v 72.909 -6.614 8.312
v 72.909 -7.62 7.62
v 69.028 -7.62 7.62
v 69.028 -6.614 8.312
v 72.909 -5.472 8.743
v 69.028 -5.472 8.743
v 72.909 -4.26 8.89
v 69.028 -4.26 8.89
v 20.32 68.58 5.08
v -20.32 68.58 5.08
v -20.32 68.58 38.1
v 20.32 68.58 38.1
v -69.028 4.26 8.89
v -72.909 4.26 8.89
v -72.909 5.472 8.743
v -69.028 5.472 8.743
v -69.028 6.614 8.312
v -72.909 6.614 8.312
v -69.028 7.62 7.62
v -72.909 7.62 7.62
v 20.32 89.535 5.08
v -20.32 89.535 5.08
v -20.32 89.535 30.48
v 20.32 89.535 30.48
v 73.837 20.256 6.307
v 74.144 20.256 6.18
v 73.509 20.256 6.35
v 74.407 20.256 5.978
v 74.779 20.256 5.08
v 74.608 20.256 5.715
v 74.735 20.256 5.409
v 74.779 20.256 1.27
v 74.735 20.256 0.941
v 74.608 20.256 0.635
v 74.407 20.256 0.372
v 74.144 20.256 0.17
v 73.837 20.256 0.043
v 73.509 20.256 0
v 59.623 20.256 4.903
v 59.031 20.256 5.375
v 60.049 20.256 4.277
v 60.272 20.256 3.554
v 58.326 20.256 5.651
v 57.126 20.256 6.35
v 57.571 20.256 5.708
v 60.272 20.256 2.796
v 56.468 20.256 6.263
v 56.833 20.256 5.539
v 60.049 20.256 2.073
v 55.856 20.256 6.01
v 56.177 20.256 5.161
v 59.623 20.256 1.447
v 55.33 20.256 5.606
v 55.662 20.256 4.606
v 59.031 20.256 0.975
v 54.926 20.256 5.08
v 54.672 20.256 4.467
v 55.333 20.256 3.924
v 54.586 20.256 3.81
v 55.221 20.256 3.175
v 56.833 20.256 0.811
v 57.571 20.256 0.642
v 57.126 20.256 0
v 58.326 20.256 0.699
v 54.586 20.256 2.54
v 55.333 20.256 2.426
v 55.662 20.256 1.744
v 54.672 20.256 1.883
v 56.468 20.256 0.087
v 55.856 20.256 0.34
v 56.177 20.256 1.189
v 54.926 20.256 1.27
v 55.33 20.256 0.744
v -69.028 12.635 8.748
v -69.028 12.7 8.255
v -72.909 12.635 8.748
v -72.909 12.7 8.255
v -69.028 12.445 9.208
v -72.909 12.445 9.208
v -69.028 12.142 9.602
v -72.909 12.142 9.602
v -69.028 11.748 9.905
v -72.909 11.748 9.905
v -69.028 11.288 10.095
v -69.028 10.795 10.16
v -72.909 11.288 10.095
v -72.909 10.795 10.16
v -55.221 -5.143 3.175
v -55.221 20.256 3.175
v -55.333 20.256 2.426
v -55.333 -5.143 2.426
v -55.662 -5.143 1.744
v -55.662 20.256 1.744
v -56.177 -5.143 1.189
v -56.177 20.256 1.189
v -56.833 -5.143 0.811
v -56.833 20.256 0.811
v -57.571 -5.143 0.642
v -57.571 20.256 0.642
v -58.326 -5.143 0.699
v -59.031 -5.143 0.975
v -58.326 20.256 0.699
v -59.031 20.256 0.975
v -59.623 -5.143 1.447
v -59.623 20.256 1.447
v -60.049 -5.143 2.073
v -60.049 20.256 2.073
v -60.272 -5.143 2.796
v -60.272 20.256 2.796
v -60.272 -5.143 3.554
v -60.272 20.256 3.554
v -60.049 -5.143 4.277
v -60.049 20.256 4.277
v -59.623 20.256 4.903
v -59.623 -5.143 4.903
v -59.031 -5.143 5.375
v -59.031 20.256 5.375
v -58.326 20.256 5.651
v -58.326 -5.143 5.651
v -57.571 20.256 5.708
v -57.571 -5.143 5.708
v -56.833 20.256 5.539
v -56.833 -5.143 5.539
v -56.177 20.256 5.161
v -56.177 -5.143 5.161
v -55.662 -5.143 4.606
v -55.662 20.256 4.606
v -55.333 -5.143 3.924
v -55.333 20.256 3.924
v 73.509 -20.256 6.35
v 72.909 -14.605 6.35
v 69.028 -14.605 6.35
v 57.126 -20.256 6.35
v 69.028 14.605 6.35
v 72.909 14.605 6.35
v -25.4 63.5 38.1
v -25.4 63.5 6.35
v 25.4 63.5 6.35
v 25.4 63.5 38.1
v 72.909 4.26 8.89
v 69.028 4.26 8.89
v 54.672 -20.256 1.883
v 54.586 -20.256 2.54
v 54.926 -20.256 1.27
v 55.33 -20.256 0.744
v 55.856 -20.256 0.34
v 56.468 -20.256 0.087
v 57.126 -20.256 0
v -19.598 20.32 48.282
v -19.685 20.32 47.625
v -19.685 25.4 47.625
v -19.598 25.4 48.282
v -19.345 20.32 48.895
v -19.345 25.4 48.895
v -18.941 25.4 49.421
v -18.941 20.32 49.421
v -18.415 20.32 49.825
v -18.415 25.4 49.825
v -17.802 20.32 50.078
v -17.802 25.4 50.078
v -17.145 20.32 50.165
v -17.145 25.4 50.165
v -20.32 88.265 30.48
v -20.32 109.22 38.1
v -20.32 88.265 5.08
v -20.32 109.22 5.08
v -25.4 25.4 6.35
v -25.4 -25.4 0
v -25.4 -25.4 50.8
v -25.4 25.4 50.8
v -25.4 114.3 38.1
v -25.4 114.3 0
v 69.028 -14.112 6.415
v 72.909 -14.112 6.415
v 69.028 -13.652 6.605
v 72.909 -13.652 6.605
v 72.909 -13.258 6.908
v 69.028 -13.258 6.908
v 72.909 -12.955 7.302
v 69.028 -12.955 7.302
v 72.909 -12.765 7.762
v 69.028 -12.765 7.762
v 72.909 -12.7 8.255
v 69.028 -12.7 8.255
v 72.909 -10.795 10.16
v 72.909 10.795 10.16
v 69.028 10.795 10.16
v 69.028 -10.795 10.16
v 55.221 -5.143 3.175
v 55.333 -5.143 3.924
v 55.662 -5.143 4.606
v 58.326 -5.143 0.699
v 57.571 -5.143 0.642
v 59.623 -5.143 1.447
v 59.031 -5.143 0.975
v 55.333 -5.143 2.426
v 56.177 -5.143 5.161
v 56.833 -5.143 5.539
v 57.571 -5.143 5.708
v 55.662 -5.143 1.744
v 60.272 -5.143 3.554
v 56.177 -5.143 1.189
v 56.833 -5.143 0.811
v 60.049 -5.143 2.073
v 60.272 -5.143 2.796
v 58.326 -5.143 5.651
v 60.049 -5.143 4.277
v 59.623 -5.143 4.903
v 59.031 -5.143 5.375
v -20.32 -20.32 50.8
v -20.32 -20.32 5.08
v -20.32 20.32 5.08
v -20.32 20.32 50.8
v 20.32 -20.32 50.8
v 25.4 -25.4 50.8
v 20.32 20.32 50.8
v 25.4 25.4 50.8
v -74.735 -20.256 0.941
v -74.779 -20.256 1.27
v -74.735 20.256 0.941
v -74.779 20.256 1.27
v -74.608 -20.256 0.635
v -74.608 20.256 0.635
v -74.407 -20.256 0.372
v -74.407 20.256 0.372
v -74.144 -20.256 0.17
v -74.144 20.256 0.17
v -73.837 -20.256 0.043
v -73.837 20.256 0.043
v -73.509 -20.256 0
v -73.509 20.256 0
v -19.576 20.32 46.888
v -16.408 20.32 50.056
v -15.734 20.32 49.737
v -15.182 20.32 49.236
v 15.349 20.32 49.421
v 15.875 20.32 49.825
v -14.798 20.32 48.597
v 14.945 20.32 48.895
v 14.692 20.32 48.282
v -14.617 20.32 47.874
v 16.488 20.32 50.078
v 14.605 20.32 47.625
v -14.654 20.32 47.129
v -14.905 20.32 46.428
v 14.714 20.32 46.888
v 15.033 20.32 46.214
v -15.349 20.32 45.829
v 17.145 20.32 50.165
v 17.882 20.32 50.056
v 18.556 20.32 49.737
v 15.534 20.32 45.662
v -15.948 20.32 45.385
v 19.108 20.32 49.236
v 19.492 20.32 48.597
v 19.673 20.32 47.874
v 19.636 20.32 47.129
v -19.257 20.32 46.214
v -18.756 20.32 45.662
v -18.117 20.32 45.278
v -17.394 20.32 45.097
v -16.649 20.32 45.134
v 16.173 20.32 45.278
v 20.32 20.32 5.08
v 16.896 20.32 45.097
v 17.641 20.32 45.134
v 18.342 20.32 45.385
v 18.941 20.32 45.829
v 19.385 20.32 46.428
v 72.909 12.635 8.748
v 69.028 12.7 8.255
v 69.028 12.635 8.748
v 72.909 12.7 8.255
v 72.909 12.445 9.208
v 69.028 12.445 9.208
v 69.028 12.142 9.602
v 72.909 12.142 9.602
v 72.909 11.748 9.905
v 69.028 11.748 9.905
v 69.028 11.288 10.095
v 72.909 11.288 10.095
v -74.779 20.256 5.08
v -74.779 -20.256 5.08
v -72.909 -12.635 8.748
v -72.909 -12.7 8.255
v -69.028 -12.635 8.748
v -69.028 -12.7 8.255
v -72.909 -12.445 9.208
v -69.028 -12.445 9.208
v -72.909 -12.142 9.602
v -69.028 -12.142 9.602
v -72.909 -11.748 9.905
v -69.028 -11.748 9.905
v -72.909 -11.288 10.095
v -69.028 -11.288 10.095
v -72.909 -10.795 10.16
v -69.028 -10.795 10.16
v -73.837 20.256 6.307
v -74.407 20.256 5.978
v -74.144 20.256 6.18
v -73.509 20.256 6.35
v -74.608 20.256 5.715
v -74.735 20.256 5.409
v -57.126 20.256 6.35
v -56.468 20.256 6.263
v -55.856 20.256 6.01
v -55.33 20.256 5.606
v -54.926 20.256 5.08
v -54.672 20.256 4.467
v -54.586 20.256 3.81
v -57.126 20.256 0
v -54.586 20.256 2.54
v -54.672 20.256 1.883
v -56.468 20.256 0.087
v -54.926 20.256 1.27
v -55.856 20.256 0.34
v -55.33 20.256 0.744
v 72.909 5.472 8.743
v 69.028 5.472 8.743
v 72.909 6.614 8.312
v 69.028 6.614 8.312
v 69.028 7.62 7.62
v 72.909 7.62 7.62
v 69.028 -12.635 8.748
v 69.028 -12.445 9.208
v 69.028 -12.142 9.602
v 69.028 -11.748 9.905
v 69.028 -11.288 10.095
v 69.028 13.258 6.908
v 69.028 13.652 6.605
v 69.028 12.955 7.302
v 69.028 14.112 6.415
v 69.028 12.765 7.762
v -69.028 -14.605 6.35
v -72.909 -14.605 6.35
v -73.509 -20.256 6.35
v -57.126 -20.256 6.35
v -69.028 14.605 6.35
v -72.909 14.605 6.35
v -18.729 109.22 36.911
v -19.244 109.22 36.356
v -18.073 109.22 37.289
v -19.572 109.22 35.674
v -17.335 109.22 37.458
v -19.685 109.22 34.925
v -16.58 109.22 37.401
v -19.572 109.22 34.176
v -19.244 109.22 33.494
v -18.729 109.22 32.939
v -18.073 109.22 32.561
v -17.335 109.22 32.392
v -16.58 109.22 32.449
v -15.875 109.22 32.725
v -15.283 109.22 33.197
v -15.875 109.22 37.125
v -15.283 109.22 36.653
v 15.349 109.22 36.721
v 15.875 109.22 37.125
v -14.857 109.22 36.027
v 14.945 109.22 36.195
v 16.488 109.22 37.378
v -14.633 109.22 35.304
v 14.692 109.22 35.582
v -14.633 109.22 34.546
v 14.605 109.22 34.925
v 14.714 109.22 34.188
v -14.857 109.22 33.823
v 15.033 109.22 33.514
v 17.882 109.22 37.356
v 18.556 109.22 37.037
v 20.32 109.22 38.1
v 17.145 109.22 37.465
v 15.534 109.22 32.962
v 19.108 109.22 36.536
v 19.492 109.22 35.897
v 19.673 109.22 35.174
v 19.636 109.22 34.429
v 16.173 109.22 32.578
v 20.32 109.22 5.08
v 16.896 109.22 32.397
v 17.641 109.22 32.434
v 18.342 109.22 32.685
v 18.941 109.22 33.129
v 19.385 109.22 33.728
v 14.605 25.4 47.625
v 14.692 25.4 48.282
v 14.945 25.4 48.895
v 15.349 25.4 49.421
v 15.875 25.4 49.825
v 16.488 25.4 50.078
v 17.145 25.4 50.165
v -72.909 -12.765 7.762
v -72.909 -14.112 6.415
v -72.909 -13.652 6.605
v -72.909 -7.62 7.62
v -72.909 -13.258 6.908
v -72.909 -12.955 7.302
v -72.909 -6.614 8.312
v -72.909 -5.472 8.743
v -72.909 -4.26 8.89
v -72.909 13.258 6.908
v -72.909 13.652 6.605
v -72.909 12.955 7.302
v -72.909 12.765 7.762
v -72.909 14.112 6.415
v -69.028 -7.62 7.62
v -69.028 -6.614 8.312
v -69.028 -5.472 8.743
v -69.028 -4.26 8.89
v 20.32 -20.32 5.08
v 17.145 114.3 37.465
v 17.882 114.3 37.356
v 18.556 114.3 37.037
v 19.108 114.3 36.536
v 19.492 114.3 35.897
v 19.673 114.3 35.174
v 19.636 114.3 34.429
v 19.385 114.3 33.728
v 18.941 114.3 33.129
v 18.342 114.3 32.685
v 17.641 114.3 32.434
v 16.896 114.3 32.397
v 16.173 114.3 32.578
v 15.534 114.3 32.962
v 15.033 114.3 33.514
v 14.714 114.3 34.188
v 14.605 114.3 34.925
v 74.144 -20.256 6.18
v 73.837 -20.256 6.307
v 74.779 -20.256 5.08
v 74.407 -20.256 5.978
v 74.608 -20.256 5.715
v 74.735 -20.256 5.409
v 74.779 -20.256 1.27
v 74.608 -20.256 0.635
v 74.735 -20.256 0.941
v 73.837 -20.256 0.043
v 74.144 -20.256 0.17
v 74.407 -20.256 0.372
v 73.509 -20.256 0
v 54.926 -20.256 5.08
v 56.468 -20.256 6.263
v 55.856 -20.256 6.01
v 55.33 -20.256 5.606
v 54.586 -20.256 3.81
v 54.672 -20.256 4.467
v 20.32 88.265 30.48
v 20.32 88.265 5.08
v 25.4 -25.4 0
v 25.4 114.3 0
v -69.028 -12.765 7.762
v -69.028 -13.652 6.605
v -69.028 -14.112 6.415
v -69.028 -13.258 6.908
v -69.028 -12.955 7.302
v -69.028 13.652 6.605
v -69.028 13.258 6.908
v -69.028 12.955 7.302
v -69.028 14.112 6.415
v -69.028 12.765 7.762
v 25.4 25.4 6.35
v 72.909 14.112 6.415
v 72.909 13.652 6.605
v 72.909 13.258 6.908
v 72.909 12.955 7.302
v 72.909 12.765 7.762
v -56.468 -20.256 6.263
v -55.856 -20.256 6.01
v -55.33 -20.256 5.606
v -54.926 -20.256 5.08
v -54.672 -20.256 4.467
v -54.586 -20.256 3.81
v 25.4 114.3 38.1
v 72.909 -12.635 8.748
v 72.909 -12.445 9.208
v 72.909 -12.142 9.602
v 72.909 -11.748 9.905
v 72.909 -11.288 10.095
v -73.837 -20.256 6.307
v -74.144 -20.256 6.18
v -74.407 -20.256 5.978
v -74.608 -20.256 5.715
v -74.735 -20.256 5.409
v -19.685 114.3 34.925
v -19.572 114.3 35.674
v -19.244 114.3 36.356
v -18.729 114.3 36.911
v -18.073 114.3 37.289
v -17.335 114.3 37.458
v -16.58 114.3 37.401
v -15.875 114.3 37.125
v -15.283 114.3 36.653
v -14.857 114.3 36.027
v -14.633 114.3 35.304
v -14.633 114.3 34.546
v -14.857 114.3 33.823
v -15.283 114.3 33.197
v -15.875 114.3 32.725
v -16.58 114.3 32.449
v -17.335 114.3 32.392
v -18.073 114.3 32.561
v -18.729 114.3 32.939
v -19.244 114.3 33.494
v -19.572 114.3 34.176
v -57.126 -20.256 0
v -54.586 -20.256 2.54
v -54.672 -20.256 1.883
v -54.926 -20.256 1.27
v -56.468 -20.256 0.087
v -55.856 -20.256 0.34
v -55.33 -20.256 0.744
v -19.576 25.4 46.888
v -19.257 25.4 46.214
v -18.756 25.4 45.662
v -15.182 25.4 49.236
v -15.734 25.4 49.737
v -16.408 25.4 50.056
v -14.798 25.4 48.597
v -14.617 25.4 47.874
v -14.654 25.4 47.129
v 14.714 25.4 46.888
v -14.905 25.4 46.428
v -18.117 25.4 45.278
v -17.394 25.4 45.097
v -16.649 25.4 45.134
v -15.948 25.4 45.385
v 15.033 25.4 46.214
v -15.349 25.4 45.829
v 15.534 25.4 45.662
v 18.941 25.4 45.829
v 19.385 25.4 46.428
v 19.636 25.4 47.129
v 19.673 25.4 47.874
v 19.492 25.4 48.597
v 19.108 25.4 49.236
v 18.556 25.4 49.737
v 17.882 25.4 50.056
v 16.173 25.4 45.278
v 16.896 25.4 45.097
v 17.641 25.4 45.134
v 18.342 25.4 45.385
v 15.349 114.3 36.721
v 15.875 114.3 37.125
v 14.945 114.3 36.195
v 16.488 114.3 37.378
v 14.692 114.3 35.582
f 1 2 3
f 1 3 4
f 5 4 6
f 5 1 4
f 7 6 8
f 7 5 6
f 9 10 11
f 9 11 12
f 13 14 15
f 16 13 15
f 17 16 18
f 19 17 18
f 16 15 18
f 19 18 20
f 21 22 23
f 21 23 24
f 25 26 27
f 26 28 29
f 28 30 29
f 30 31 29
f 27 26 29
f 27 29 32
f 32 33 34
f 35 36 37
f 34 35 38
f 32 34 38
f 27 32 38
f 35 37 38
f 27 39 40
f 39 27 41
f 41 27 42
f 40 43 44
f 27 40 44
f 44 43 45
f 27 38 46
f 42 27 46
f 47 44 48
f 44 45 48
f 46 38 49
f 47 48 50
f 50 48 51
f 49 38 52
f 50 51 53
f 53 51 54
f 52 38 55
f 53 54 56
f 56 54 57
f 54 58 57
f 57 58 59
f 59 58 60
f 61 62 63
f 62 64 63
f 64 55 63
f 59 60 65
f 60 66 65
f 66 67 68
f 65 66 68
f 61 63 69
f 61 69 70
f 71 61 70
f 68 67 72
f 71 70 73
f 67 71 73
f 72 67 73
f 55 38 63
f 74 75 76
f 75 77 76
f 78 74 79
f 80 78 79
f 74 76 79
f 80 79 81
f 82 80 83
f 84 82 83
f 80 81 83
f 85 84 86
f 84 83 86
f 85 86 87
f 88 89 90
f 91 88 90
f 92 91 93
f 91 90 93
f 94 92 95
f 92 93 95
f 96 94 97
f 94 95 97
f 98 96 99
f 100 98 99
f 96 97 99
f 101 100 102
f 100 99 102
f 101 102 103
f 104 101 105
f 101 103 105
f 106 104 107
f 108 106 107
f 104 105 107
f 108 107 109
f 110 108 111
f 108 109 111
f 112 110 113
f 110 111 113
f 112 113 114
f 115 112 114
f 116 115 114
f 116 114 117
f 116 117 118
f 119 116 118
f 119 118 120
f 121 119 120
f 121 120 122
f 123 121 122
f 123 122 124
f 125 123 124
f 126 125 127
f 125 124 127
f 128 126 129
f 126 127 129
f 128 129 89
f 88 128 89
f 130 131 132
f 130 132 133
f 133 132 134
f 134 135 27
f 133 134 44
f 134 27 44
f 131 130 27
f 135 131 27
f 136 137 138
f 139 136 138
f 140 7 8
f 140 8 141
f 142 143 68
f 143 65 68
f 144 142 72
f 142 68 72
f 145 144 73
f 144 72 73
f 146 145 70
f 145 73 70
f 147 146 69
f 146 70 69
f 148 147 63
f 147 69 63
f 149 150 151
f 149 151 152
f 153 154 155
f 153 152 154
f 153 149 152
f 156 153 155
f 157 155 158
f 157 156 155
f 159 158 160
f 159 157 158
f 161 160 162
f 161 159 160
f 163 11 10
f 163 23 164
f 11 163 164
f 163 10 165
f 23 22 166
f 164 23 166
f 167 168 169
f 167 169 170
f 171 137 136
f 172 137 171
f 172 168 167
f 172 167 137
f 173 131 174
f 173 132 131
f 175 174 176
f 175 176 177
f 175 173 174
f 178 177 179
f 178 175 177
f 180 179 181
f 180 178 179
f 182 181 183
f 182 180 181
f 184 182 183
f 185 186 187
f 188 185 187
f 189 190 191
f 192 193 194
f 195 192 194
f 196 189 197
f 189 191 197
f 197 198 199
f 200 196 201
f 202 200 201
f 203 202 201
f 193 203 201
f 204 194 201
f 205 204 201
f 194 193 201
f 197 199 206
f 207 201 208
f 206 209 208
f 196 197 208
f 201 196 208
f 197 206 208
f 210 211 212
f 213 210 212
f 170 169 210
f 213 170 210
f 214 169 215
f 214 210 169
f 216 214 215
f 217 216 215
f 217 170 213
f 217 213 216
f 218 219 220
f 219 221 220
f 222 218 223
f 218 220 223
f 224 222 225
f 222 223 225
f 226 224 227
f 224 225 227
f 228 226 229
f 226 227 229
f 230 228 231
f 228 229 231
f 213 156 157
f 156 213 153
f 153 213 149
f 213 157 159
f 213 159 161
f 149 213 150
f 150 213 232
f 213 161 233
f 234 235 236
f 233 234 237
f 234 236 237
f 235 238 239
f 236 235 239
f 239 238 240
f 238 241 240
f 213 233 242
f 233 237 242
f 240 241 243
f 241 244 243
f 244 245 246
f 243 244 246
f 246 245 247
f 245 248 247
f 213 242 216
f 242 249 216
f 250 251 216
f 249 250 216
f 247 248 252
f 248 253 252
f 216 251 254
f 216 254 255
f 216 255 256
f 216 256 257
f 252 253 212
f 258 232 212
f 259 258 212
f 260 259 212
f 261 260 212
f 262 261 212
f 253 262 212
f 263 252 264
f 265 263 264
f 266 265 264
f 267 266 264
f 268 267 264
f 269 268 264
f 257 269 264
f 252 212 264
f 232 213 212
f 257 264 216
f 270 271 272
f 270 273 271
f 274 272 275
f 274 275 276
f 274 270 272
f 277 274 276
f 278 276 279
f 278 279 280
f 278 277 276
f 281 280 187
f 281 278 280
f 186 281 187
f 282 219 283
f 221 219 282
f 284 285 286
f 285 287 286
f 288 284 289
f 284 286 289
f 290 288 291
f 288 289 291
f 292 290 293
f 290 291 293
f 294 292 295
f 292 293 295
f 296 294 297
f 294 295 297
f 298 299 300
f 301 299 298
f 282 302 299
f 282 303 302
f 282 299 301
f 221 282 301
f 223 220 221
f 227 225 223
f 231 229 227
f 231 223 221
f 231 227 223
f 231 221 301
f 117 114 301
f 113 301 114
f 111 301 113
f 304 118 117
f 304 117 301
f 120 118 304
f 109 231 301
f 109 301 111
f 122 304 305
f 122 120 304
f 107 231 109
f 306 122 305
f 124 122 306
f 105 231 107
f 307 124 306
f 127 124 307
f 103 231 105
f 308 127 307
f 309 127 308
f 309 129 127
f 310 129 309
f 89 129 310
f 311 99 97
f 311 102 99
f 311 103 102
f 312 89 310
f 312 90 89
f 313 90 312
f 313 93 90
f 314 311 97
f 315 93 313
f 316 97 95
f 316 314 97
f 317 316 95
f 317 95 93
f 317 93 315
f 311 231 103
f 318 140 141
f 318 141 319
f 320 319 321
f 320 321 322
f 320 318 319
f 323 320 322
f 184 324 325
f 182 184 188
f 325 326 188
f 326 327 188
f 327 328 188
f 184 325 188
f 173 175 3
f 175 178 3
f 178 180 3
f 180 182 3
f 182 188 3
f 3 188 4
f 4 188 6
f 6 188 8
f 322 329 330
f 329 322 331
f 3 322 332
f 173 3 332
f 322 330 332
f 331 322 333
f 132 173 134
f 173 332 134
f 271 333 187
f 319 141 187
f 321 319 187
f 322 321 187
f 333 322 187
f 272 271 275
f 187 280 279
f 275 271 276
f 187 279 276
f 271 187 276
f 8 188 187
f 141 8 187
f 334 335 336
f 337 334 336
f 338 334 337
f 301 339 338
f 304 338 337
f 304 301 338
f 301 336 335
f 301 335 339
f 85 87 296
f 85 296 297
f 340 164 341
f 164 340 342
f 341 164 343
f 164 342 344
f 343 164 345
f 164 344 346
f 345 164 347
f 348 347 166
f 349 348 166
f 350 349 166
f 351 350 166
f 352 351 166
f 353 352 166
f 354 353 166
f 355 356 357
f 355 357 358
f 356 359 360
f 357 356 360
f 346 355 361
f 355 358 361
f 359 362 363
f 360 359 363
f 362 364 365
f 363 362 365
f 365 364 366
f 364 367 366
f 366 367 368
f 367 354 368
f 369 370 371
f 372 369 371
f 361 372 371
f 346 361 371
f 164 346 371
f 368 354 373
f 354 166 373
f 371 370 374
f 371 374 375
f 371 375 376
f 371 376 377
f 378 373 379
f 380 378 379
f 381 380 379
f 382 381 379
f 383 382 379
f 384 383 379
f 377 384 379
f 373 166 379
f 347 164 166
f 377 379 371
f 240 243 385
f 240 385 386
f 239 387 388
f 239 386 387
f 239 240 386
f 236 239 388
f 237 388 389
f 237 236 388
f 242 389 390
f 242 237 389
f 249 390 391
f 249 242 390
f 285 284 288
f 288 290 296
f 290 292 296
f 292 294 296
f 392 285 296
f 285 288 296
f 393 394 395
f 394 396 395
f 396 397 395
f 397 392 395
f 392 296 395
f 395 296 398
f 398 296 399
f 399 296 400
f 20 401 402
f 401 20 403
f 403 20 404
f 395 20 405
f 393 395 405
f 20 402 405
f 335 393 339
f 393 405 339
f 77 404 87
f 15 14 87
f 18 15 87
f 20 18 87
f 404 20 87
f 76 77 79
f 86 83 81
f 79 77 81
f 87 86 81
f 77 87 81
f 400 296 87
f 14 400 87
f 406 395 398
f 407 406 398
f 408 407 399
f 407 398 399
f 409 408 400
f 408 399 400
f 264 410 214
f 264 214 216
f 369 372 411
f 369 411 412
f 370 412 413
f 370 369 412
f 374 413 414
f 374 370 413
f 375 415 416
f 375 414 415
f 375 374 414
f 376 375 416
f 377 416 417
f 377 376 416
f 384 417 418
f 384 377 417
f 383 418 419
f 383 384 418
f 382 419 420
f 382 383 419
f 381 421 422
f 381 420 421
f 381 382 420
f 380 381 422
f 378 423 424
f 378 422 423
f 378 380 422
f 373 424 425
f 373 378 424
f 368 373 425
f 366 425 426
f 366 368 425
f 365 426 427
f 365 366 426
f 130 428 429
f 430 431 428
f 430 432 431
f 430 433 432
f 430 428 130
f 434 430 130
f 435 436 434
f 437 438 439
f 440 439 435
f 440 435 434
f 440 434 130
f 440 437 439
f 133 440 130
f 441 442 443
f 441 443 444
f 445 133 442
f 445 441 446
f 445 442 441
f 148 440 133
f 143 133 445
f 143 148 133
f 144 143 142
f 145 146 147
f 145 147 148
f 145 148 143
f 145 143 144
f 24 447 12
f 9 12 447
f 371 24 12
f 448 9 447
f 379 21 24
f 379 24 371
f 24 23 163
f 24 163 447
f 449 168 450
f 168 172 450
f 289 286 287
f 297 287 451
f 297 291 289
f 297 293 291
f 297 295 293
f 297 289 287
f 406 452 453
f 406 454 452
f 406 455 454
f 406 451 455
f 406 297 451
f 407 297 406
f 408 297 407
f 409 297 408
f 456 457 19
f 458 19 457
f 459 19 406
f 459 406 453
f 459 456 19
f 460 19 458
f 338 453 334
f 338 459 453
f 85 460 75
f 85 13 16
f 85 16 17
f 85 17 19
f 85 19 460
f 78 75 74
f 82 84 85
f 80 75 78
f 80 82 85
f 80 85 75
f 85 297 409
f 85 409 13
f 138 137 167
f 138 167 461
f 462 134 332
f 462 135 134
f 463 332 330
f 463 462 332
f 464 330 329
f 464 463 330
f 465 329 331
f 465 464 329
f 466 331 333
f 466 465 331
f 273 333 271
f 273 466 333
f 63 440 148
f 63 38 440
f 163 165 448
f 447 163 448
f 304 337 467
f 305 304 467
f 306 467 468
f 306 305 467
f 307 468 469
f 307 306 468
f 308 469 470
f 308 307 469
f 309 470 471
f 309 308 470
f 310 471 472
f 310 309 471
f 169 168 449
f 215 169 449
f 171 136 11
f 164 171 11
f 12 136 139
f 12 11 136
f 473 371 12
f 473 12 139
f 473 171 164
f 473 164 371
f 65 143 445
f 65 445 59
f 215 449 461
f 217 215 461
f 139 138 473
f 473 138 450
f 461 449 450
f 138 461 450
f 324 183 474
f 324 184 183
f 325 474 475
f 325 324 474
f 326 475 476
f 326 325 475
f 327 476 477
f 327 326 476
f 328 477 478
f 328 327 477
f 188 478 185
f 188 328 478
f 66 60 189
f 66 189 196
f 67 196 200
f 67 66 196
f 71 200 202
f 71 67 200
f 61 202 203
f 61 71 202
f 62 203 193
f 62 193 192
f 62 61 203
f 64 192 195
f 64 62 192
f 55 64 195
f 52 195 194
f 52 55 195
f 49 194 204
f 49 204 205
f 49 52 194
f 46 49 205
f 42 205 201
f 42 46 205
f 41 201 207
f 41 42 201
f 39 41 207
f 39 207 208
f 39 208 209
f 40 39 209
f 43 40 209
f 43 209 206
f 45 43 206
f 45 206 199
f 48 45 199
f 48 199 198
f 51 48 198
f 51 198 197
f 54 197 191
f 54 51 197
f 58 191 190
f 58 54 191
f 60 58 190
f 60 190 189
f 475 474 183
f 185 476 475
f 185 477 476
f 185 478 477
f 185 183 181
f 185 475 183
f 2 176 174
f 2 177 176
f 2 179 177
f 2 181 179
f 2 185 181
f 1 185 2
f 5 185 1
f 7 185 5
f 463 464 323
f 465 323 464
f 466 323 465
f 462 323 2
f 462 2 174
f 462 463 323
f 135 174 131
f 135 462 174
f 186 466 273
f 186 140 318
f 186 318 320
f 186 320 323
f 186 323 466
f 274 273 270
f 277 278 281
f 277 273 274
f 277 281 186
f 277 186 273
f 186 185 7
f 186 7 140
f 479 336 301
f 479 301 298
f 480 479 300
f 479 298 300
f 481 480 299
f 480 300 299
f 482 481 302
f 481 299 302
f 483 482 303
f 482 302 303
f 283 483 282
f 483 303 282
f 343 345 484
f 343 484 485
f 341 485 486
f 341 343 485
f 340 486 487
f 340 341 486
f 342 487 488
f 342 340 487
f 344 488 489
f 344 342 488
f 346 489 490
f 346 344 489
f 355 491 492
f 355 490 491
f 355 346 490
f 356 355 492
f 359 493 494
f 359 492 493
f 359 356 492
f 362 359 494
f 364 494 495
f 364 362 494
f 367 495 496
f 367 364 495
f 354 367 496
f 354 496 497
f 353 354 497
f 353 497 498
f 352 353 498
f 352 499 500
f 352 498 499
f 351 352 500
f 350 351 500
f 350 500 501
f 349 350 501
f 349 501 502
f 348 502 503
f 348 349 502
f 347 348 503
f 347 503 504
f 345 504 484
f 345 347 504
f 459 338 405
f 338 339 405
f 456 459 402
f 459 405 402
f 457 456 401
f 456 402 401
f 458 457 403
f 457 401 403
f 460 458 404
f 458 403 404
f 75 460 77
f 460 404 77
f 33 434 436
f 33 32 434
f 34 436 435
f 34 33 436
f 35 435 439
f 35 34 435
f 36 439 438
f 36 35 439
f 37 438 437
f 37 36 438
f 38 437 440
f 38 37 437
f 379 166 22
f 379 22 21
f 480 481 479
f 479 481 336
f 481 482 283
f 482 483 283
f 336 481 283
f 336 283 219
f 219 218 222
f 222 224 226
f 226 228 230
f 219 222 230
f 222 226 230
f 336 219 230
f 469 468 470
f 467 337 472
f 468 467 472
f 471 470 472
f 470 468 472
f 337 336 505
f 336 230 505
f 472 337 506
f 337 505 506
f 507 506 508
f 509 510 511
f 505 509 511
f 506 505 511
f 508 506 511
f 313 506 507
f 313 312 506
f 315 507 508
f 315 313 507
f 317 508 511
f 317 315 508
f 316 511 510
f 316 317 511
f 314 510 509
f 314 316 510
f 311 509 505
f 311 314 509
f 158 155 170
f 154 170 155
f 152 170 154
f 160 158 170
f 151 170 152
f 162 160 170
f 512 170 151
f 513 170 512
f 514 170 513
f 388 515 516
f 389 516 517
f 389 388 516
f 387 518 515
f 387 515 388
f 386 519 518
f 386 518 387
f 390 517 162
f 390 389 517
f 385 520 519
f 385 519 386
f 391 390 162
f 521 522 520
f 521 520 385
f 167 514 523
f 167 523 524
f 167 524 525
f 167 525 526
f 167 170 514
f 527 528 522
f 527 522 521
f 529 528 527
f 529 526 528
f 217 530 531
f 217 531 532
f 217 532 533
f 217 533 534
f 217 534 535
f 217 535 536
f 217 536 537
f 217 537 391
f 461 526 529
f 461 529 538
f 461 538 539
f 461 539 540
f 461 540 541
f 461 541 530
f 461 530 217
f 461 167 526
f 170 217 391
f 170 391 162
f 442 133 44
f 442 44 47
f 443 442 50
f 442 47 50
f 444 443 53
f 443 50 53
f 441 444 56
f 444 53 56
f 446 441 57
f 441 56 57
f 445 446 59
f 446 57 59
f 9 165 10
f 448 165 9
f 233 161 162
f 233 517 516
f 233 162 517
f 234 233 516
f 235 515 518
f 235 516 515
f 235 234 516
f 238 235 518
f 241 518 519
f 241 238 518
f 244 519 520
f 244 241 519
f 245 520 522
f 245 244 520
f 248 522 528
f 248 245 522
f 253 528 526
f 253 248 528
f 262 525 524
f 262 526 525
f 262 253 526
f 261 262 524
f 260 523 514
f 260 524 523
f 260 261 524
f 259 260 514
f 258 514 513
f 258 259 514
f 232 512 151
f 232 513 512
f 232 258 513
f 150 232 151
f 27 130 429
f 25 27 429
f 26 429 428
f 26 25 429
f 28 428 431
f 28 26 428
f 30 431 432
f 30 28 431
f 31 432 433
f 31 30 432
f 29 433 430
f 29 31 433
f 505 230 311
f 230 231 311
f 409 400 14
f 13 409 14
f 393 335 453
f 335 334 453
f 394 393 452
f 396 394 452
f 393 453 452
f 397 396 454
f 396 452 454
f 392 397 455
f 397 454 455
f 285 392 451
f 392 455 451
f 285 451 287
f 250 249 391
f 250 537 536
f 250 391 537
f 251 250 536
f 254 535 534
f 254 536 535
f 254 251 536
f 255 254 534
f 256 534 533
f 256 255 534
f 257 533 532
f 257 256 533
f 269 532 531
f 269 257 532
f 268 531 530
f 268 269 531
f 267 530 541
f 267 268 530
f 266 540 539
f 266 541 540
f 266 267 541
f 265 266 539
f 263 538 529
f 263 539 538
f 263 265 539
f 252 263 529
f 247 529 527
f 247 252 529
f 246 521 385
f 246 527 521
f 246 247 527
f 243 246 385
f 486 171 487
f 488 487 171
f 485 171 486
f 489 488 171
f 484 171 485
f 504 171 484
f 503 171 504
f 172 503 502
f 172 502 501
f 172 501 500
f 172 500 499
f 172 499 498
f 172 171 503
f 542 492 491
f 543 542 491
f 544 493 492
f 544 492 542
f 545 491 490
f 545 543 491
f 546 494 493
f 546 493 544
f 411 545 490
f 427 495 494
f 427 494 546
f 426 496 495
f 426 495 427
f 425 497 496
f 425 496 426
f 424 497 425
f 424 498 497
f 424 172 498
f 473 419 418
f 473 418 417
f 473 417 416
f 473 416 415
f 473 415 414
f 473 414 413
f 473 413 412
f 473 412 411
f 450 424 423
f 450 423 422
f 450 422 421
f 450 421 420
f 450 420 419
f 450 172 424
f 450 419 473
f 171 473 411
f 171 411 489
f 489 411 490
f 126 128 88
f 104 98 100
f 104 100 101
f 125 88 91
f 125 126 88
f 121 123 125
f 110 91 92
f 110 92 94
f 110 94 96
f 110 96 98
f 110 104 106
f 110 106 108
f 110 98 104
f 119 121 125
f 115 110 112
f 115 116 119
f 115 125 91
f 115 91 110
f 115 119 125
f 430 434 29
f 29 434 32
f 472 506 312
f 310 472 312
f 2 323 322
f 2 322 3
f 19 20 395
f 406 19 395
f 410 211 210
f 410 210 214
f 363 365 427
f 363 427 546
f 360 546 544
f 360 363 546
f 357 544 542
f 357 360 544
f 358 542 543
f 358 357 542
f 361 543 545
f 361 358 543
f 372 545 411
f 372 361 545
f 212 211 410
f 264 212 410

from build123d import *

# Parameters (mm, degrees)
F0_W         = 50.8
F0_H         = 50.8
F1_DEPTH     = 50.8
F2_DEPTH     = 38.1
F0_H_2       = 38.1
F3_DEPTH     = 6.35
F4_T         = -5.08
F6_DEPTH     = 50.8
F7_W         = 20.193
F7_H         = 40.513
F8_DEPTH     = 6.35
F11_DEPTH    = 3.81
F12_W        = 7.62
F12_H        = 1.27
F13_DEPTH    = 25.4
F14_R        = 1.90499
F15_T1_DEPTH = 3.8801973377
F16_R        = 2.54
F17_DEPTH    = 50.8
F18_R        = 2.54
F19_R        = 1.27
F20_W        = 40.64
F20_H        = 0.635
F21_DEPTH    = 25.4
F22_DEPTH    = 25.4


# Not quite as in the source:
# - a fillet or chamfer that OpenCascade refuses, or shapes differently, is made with other operations: its cross-section is extruded or revolved along the edge and cut away or added
# - a fillet or chamfer is up to 0.001 mm smaller than in the source, because OpenCascade refuses the exact size


with BuildPart() as f1:
    # F0 (on Top) → F1 (new body)
    with BuildSketch(Plane.XY):
        Rectangle(F0_W, F0_H)
    extrude(amount=F1_DEPTH)



with BuildPart() as f2:
    # F0 (on Top) → F2 (new body)
    with BuildSketch(Plane.XY):
        with Locations((0, 88.9)):
            Rectangle(F0_W, F0_H)
    extrude(amount=F2_DEPTH)


with BuildPart() as f1_1:
    add(f1.part)

    add(f2.part)  # F3 merges F2
    # F0 (on Top) → F3 (join)
    with BuildSketch(Plane.XY):
        with Locations((0, 44.45)):
            Rectangle(F0_W, F0_H_2)
    extrude(amount=F3_DEPTH)

    # F4
    f4_openings = [f1_1.faces().sort_by_distance(p)[0] for p in [
        (0, 88.9, 38.1),
        (0, 0, 50.8),
    ]]
    offset(amount=F4_T, openings=f4_openings, kind=Kind.INTERSECTION)

    # F5 (on face) → F6 (cut)
    with BuildSketch(Plane(origin=(0, -20.32, 0), x_dir=(-1, 0, 0), z_dir=(0, 1, 0))):
        with BuildLine():
            ThreePointArc((-17.145, 50.165), (-18.9410512242, 45.8289487758), (-14.605, 47.625))
            ThreePointArc((-14.605, 47.625), (-15.3489487758, 49.4210512242), (-17.145, 50.165))
        make_face()
        with BuildLine():
            ThreePointArc((17.145, 50.165), (15.3489487758, 45.8289487758), (19.685, 47.625))
            ThreePointArc((19.685, 47.625), (18.9410512242, 49.4210512242), (17.145, 50.165))
        make_face()
    extrude(amount=F6_DEPTH, mode=Mode.SUBTRACT)

    # F16 (on face) → F17 (cut)
    with BuildSketch(Plane(origin=(0, 68.58, 0), x_dir=(-1, 0, 0), z_dir=(0, 1, 0))):
        with BuildLine():
            ThreePointArc((-14.605, 34.925), (-15.3489487758, 36.7210512242), (-17.145, 37.465))
            ThreePointArc((-17.145, 37.465), (-18.9410512242, 33.1289487758), (-14.605, 34.925))
        make_face()
        with Locations((17.145, 34.925)):
            Circle(F16_R)
    extrude(amount=F17_DEPTH, mode=Mode.SUBTRACT)

    # F20 (on face) → F21 (join)
    with BuildSketch(Plane.XY.offset(5.08)):
        with Locations((0, 89.2175)):
            Rectangle(F20_W, F20_H)
        with Locations((0, 88.5825)):
            Rectangle(F20_W, F20_H)
    extrude(amount=F21_DEPTH)


with BuildPart() as f8:
    # F7 (on Top) → F8 (new body)
    with BuildSketch(Plane.XY):
        with Locations((-64.6820784919, 0)):
            Rectangle(F7_W, F7_H)
    extrude(amount=F8_DEPTH)

    # F10 (on face) → F11 (join)
    with BuildSketch(Plane.XY.offset(6.35)):
        Polygon((-72.9086771607, 12.7), (-72.9086771607, 0), (-72.9086771607, -12.7), (-69.028479823, -12.7), (-69.028479823, 12.7), align=None)
    extrude(amount=F11_DEPTH)

    # F12 (on face) → F13 (cut)
    with BuildSketch(Plane(origin=(-72.9086771607, 0, 0), x_dir=(0, -1, 0), z_dir=(-1, 0, 0))):
        with Locations((-3.81, 8.255)):
            Rectangle(F12_W, F12_H)
        with Locations((3.81, 8.255)):
            Rectangle(F12_W, F12_H)
    extrude(amount=-F13_DEPTH, mode=Mode.SUBTRACT)

    # F14 (radius 1.905 in the source; OpenCascade refuses exactly that, so slightly less here)
    f14_edges = [f8.edges().sort_by_distance(p)[0] for p in [
        (-70.968578, -12.7, 10.16),
        (-70.968578, 12.7, 10.16),
        (-70.968578, 12.7, 6.35),
        (-70.968578, -12.7, 6.35),
    ]]
    fillet(f14_edges, radius=F14_R)

    # F15: fillet of radius 5.08 on 2 edges, made by hand

    # F15_s2 → F15_t1 (join)
    with BuildSketch(Plane.YZ.offset(-72.9086771607)):
        with BuildLine():
            ThreePointArc((-7.62, 7.62), (-6.0559470592, 8.5619048812), (-4.2598958349, 8.89))
            Line((-4.2598958349, 8.89), (-7.62, 8.89))
            Line((-7.62, 8.89), (-7.62, 7.62))
        make_face()
        with BuildLine():
            ThreePointArc((4.2598958349, 8.89), (6.0559470592, 8.5619048812), (7.62, 7.62))
            Line((7.62, 7.62), (7.62, 8.89))
            Line((7.62, 8.89), (4.2598958349, 8.89))
        make_face()
    extrude(amount=F15_T1_DEPTH)

    # F18
    f18_edges = [f8.edges().sort_by_distance(p)[0] for p in [
        (-54.585578, 0, 6.35),
        (-54.585578, 0, 0),
    ]]
    fillet(f18_edges, radius=F18_R)

    # F19
    f19_edges = [f8.edges().sort_by_distance(p)[0] for p in [
        (-74.778578, 0, 6.35),
        (-74.778578, 0, 0),
    ]]
    fillet(f19_edges, radius=F19_R)

    # F9 (on face) → F22 (cut)
    with BuildSketch(Plane(origin=(0, 20.2565, 0), x_dir=(-1, 0, 0), z_dir=(0, 1, 0))):
        with BuildLine():
            ThreePointArc((60.3005784919, 3.175), (57.7605784919, 5.715), (55.2205784919, 3.175))
            ThreePointArc((55.2205784919, 3.175), (57.7605784919, 0.635), (60.3005784919, 3.175))
        make_face()
    extrude(amount=-F22_DEPTH, mode=Mode.SUBTRACT)


with BuildPart() as f23_1:
    # F23: instance of F8
    add(f8.part.mirror(Plane.YZ))


solid = Compound([f1_1.part, f8.part, f23_1.part])
